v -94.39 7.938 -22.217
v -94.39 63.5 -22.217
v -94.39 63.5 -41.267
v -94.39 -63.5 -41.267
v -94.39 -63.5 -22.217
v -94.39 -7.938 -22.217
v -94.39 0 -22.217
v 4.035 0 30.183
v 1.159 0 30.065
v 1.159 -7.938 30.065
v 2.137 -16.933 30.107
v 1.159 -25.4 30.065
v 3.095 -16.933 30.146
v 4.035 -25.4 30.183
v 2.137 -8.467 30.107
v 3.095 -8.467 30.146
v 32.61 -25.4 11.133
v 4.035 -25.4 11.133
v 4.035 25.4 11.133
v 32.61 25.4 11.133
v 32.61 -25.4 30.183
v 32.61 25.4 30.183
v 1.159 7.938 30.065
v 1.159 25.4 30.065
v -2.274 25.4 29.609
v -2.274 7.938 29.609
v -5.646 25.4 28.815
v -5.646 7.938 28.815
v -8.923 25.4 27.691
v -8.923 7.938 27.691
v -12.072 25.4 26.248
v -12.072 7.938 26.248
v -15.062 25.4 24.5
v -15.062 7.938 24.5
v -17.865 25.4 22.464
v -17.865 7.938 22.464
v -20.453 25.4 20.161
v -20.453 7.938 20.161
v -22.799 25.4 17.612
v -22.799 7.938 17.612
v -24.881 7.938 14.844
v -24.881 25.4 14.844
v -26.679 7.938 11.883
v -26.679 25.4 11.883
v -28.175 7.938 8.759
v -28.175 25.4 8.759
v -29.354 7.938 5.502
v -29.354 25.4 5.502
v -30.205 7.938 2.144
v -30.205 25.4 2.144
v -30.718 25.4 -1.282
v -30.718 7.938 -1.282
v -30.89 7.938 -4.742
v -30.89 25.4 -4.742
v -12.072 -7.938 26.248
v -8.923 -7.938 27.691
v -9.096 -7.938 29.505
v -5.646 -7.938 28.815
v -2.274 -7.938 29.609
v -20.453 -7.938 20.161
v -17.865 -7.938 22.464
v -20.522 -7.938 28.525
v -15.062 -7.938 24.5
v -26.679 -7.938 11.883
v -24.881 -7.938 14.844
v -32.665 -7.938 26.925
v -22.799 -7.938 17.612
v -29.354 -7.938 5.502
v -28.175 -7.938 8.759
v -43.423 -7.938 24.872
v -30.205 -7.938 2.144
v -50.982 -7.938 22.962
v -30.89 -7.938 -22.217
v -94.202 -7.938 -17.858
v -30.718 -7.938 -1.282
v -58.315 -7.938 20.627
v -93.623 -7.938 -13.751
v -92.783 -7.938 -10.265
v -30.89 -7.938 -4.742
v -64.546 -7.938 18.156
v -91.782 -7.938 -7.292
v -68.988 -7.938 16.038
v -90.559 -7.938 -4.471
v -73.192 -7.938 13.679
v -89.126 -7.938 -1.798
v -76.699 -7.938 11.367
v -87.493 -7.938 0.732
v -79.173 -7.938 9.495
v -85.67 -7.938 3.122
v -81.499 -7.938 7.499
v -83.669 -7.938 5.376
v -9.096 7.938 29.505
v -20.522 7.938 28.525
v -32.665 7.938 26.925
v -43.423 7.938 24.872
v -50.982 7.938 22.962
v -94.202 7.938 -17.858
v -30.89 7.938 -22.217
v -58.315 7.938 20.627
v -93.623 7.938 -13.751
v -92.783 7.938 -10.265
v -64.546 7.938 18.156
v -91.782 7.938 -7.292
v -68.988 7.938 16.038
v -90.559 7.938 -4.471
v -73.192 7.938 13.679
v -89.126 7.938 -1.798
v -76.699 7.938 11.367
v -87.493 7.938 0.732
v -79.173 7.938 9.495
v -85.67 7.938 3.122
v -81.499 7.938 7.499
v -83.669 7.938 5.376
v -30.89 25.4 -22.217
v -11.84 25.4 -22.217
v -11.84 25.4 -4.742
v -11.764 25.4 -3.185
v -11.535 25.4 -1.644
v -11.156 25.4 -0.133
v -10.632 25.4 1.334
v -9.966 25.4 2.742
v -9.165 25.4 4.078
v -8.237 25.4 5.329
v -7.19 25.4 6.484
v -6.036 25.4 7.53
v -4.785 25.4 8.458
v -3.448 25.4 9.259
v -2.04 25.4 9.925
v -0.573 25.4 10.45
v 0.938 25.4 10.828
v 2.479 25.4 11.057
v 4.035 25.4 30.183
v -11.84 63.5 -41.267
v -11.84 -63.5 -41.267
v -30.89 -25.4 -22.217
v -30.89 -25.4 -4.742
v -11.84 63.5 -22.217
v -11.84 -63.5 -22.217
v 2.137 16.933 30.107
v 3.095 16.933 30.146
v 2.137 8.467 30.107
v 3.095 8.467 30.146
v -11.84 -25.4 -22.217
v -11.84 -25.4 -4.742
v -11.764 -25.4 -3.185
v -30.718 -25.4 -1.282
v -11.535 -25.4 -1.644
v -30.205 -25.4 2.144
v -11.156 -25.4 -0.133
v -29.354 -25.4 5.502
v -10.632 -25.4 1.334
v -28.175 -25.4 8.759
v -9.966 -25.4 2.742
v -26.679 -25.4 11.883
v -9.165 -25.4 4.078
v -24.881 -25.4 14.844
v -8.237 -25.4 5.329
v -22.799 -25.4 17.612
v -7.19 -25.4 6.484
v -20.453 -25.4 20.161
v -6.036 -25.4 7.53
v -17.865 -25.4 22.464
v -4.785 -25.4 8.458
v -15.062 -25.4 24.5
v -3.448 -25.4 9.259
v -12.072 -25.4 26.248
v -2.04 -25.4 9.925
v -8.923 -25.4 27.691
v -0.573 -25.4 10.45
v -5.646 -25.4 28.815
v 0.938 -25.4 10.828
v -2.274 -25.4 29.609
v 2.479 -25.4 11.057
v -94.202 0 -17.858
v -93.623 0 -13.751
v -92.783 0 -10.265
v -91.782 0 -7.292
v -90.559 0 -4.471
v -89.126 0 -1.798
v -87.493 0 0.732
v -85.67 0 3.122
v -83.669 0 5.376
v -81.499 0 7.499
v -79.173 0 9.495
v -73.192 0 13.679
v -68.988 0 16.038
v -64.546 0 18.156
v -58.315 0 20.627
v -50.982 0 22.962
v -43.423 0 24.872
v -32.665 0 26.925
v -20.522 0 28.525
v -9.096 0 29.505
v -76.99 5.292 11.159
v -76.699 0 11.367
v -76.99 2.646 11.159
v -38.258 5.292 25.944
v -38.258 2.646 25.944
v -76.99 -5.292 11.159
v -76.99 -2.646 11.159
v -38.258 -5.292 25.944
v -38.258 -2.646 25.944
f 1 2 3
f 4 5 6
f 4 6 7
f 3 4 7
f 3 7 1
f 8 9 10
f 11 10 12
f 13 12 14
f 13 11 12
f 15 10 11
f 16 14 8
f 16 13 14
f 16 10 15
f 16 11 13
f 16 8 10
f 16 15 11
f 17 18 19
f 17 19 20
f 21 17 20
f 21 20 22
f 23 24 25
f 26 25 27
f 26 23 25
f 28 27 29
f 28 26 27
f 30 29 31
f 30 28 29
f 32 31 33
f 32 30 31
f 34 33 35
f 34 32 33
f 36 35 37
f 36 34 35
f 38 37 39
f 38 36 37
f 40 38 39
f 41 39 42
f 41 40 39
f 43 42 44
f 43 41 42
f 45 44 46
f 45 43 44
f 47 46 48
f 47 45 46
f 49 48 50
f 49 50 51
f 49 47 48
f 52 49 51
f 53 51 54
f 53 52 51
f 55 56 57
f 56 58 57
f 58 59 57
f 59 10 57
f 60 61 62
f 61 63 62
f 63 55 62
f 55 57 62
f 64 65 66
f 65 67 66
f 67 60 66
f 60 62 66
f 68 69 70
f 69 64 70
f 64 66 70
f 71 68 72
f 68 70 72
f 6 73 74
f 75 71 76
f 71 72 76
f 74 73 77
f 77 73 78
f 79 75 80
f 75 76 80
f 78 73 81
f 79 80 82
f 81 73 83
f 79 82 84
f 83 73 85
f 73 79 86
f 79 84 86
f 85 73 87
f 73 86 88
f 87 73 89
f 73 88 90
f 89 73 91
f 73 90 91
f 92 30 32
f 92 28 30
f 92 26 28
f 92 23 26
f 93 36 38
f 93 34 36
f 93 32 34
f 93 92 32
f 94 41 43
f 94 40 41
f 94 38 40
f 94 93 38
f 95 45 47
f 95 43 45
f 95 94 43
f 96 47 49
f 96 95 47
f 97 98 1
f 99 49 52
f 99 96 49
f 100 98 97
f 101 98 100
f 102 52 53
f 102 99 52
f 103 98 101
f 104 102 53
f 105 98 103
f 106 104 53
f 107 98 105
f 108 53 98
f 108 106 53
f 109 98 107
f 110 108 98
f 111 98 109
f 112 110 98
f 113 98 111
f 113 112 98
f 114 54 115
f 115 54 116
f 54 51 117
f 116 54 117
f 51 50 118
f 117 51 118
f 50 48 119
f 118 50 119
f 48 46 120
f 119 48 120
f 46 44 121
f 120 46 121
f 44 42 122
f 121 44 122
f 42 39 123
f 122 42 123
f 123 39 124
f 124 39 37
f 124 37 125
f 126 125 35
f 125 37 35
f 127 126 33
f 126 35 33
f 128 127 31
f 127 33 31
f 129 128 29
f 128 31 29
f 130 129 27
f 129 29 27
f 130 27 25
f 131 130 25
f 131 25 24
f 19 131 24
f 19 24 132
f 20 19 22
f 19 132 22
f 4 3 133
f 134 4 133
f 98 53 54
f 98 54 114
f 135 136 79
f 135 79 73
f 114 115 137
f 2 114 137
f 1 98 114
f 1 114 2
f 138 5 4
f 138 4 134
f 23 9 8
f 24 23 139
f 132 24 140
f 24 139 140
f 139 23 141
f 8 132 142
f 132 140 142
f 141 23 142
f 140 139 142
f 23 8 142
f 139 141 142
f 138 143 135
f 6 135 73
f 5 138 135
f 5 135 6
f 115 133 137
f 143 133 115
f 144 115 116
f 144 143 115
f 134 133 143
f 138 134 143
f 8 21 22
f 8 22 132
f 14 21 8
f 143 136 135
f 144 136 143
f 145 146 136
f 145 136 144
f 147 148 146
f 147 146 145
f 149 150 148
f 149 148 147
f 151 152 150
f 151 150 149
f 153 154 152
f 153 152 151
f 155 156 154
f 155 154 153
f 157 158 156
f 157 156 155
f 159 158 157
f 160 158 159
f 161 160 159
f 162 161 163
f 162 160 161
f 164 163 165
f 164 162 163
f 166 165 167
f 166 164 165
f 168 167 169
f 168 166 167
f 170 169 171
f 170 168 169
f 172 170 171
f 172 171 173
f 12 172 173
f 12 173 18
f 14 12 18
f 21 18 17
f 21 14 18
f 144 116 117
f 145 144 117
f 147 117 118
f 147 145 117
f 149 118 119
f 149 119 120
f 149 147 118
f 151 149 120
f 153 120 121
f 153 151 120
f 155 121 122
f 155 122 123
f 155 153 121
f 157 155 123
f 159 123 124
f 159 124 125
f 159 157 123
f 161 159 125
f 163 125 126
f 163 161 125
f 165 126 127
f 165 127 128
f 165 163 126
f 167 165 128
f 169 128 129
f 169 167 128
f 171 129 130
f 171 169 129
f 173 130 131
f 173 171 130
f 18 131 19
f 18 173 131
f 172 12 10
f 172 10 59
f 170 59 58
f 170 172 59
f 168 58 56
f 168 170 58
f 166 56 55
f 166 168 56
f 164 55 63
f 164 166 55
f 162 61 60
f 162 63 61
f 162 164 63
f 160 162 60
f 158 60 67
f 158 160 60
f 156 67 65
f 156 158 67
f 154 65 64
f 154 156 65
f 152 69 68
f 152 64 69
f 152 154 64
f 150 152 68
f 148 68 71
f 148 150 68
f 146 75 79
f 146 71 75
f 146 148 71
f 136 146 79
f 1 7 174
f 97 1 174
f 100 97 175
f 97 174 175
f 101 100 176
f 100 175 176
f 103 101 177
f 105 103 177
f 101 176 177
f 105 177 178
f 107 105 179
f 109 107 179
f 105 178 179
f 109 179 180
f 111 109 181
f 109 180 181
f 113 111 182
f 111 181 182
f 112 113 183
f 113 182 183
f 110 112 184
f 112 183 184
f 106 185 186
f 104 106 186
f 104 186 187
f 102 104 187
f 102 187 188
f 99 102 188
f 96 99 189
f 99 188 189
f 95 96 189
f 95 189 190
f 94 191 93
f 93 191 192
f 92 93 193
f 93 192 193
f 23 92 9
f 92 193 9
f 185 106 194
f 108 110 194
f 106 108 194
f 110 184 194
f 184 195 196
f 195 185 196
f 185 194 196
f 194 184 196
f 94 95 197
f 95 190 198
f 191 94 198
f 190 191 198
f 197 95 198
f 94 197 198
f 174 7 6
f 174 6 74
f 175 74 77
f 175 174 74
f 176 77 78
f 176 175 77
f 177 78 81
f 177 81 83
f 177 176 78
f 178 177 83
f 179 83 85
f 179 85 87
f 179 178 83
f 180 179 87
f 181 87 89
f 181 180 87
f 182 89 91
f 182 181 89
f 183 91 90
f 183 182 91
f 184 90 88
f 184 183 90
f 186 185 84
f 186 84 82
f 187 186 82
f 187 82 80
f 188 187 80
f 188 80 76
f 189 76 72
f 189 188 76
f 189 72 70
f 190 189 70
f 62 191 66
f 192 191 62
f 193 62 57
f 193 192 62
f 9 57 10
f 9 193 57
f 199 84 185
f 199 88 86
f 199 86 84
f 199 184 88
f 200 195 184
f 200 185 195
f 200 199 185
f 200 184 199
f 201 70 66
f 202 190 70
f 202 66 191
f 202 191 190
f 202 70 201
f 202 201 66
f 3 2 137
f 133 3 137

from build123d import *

# Parameters (mm, degrees)
F1_DEPTH = 63.5
F0_W     = 25.4
F0_H     = 19.05
F2_DEPTH = 25.4
F3_DEPTH = 7.9375


with BuildPart() as f1:
    # F0 (on Front) → F1 (new body, symmetric)
    with BuildSketch(Plane.XZ):
        Polygon((-30.89006, -22.216722), (-94.39006, -22.216722), (-94.39006, -41.266722), (-11.84006, -41.266722), (-11.84006, -22.216722), align=None)
    extrude(amount=F1_DEPTH, both=True)

    # F0 (on Front) → F2 (join, symmetric)
    with BuildSketch(Plane.XZ):
        with BuildLine():
            Line((-30.89006, -4.741522), (-30.89006, -22.216722))
            Line((-30.89006, -22.216722), (-11.84006, -22.216722))
            Line((-11.84006, -22.216722), (-11.84006, -4.741522))
            ThreePointArc((-11.84006, -4.741522), (-7.19038, 6.483798), (4.03494, 11.133478))
            Line((4.03494, 11.133478), (7.20994, 11.133478))
            Line((7.20994, 11.133478), (7.20994, 30.183478))
            Line((7.20994, 30.183478), (4.03494, 30.183478))
            add(Edge.make_bspline(
                [(1.159366, 30.064896), (2.145677, 30.107801), (3.105038, 30.147007), (4.03494, 30.183478)],
                knots=[108.256828, 108.256828, 108.256828, 108.256828, 111.504536, 111.504536, 111.504536, 111.504536], degree=3))
            ThreePointArc((1.159366, 30.064896), (-21.657326, 18.915678), (-30.89006, -4.741522))
        make_face()
        with Locations((19.90994, 20.658478)):
            Rectangle(F0_W, F0_H)
    extrude(amount=F2_DEPTH, both=True)

    # F0 (on Front) → F3 (join, symmetric)
    with BuildSketch(Plane.XZ):
        with BuildLine():
            add(Edge.make_bspline(
                [(-94.39006, -22.216722), (-94.538549, 23.095014), (-31.717619, 28.634726), (1.159366, 30.064896)],
                knots=[0, 0, 0, 0, 108.256828, 108.256828, 108.256828, 108.256828], degree=3))
            Line((-94.39006, -22.216722), (-30.89006, -22.216722))
            Line((-30.89006, -22.216722), (-30.89006, -4.741522))
            ThreePointArc((-30.89006, -4.741522), (-21.657326, 18.915678), (1.159366, 30.064896))
        make_face()
    extrude(amount=F3_DEPTH, both=True)


solid = f1.part
